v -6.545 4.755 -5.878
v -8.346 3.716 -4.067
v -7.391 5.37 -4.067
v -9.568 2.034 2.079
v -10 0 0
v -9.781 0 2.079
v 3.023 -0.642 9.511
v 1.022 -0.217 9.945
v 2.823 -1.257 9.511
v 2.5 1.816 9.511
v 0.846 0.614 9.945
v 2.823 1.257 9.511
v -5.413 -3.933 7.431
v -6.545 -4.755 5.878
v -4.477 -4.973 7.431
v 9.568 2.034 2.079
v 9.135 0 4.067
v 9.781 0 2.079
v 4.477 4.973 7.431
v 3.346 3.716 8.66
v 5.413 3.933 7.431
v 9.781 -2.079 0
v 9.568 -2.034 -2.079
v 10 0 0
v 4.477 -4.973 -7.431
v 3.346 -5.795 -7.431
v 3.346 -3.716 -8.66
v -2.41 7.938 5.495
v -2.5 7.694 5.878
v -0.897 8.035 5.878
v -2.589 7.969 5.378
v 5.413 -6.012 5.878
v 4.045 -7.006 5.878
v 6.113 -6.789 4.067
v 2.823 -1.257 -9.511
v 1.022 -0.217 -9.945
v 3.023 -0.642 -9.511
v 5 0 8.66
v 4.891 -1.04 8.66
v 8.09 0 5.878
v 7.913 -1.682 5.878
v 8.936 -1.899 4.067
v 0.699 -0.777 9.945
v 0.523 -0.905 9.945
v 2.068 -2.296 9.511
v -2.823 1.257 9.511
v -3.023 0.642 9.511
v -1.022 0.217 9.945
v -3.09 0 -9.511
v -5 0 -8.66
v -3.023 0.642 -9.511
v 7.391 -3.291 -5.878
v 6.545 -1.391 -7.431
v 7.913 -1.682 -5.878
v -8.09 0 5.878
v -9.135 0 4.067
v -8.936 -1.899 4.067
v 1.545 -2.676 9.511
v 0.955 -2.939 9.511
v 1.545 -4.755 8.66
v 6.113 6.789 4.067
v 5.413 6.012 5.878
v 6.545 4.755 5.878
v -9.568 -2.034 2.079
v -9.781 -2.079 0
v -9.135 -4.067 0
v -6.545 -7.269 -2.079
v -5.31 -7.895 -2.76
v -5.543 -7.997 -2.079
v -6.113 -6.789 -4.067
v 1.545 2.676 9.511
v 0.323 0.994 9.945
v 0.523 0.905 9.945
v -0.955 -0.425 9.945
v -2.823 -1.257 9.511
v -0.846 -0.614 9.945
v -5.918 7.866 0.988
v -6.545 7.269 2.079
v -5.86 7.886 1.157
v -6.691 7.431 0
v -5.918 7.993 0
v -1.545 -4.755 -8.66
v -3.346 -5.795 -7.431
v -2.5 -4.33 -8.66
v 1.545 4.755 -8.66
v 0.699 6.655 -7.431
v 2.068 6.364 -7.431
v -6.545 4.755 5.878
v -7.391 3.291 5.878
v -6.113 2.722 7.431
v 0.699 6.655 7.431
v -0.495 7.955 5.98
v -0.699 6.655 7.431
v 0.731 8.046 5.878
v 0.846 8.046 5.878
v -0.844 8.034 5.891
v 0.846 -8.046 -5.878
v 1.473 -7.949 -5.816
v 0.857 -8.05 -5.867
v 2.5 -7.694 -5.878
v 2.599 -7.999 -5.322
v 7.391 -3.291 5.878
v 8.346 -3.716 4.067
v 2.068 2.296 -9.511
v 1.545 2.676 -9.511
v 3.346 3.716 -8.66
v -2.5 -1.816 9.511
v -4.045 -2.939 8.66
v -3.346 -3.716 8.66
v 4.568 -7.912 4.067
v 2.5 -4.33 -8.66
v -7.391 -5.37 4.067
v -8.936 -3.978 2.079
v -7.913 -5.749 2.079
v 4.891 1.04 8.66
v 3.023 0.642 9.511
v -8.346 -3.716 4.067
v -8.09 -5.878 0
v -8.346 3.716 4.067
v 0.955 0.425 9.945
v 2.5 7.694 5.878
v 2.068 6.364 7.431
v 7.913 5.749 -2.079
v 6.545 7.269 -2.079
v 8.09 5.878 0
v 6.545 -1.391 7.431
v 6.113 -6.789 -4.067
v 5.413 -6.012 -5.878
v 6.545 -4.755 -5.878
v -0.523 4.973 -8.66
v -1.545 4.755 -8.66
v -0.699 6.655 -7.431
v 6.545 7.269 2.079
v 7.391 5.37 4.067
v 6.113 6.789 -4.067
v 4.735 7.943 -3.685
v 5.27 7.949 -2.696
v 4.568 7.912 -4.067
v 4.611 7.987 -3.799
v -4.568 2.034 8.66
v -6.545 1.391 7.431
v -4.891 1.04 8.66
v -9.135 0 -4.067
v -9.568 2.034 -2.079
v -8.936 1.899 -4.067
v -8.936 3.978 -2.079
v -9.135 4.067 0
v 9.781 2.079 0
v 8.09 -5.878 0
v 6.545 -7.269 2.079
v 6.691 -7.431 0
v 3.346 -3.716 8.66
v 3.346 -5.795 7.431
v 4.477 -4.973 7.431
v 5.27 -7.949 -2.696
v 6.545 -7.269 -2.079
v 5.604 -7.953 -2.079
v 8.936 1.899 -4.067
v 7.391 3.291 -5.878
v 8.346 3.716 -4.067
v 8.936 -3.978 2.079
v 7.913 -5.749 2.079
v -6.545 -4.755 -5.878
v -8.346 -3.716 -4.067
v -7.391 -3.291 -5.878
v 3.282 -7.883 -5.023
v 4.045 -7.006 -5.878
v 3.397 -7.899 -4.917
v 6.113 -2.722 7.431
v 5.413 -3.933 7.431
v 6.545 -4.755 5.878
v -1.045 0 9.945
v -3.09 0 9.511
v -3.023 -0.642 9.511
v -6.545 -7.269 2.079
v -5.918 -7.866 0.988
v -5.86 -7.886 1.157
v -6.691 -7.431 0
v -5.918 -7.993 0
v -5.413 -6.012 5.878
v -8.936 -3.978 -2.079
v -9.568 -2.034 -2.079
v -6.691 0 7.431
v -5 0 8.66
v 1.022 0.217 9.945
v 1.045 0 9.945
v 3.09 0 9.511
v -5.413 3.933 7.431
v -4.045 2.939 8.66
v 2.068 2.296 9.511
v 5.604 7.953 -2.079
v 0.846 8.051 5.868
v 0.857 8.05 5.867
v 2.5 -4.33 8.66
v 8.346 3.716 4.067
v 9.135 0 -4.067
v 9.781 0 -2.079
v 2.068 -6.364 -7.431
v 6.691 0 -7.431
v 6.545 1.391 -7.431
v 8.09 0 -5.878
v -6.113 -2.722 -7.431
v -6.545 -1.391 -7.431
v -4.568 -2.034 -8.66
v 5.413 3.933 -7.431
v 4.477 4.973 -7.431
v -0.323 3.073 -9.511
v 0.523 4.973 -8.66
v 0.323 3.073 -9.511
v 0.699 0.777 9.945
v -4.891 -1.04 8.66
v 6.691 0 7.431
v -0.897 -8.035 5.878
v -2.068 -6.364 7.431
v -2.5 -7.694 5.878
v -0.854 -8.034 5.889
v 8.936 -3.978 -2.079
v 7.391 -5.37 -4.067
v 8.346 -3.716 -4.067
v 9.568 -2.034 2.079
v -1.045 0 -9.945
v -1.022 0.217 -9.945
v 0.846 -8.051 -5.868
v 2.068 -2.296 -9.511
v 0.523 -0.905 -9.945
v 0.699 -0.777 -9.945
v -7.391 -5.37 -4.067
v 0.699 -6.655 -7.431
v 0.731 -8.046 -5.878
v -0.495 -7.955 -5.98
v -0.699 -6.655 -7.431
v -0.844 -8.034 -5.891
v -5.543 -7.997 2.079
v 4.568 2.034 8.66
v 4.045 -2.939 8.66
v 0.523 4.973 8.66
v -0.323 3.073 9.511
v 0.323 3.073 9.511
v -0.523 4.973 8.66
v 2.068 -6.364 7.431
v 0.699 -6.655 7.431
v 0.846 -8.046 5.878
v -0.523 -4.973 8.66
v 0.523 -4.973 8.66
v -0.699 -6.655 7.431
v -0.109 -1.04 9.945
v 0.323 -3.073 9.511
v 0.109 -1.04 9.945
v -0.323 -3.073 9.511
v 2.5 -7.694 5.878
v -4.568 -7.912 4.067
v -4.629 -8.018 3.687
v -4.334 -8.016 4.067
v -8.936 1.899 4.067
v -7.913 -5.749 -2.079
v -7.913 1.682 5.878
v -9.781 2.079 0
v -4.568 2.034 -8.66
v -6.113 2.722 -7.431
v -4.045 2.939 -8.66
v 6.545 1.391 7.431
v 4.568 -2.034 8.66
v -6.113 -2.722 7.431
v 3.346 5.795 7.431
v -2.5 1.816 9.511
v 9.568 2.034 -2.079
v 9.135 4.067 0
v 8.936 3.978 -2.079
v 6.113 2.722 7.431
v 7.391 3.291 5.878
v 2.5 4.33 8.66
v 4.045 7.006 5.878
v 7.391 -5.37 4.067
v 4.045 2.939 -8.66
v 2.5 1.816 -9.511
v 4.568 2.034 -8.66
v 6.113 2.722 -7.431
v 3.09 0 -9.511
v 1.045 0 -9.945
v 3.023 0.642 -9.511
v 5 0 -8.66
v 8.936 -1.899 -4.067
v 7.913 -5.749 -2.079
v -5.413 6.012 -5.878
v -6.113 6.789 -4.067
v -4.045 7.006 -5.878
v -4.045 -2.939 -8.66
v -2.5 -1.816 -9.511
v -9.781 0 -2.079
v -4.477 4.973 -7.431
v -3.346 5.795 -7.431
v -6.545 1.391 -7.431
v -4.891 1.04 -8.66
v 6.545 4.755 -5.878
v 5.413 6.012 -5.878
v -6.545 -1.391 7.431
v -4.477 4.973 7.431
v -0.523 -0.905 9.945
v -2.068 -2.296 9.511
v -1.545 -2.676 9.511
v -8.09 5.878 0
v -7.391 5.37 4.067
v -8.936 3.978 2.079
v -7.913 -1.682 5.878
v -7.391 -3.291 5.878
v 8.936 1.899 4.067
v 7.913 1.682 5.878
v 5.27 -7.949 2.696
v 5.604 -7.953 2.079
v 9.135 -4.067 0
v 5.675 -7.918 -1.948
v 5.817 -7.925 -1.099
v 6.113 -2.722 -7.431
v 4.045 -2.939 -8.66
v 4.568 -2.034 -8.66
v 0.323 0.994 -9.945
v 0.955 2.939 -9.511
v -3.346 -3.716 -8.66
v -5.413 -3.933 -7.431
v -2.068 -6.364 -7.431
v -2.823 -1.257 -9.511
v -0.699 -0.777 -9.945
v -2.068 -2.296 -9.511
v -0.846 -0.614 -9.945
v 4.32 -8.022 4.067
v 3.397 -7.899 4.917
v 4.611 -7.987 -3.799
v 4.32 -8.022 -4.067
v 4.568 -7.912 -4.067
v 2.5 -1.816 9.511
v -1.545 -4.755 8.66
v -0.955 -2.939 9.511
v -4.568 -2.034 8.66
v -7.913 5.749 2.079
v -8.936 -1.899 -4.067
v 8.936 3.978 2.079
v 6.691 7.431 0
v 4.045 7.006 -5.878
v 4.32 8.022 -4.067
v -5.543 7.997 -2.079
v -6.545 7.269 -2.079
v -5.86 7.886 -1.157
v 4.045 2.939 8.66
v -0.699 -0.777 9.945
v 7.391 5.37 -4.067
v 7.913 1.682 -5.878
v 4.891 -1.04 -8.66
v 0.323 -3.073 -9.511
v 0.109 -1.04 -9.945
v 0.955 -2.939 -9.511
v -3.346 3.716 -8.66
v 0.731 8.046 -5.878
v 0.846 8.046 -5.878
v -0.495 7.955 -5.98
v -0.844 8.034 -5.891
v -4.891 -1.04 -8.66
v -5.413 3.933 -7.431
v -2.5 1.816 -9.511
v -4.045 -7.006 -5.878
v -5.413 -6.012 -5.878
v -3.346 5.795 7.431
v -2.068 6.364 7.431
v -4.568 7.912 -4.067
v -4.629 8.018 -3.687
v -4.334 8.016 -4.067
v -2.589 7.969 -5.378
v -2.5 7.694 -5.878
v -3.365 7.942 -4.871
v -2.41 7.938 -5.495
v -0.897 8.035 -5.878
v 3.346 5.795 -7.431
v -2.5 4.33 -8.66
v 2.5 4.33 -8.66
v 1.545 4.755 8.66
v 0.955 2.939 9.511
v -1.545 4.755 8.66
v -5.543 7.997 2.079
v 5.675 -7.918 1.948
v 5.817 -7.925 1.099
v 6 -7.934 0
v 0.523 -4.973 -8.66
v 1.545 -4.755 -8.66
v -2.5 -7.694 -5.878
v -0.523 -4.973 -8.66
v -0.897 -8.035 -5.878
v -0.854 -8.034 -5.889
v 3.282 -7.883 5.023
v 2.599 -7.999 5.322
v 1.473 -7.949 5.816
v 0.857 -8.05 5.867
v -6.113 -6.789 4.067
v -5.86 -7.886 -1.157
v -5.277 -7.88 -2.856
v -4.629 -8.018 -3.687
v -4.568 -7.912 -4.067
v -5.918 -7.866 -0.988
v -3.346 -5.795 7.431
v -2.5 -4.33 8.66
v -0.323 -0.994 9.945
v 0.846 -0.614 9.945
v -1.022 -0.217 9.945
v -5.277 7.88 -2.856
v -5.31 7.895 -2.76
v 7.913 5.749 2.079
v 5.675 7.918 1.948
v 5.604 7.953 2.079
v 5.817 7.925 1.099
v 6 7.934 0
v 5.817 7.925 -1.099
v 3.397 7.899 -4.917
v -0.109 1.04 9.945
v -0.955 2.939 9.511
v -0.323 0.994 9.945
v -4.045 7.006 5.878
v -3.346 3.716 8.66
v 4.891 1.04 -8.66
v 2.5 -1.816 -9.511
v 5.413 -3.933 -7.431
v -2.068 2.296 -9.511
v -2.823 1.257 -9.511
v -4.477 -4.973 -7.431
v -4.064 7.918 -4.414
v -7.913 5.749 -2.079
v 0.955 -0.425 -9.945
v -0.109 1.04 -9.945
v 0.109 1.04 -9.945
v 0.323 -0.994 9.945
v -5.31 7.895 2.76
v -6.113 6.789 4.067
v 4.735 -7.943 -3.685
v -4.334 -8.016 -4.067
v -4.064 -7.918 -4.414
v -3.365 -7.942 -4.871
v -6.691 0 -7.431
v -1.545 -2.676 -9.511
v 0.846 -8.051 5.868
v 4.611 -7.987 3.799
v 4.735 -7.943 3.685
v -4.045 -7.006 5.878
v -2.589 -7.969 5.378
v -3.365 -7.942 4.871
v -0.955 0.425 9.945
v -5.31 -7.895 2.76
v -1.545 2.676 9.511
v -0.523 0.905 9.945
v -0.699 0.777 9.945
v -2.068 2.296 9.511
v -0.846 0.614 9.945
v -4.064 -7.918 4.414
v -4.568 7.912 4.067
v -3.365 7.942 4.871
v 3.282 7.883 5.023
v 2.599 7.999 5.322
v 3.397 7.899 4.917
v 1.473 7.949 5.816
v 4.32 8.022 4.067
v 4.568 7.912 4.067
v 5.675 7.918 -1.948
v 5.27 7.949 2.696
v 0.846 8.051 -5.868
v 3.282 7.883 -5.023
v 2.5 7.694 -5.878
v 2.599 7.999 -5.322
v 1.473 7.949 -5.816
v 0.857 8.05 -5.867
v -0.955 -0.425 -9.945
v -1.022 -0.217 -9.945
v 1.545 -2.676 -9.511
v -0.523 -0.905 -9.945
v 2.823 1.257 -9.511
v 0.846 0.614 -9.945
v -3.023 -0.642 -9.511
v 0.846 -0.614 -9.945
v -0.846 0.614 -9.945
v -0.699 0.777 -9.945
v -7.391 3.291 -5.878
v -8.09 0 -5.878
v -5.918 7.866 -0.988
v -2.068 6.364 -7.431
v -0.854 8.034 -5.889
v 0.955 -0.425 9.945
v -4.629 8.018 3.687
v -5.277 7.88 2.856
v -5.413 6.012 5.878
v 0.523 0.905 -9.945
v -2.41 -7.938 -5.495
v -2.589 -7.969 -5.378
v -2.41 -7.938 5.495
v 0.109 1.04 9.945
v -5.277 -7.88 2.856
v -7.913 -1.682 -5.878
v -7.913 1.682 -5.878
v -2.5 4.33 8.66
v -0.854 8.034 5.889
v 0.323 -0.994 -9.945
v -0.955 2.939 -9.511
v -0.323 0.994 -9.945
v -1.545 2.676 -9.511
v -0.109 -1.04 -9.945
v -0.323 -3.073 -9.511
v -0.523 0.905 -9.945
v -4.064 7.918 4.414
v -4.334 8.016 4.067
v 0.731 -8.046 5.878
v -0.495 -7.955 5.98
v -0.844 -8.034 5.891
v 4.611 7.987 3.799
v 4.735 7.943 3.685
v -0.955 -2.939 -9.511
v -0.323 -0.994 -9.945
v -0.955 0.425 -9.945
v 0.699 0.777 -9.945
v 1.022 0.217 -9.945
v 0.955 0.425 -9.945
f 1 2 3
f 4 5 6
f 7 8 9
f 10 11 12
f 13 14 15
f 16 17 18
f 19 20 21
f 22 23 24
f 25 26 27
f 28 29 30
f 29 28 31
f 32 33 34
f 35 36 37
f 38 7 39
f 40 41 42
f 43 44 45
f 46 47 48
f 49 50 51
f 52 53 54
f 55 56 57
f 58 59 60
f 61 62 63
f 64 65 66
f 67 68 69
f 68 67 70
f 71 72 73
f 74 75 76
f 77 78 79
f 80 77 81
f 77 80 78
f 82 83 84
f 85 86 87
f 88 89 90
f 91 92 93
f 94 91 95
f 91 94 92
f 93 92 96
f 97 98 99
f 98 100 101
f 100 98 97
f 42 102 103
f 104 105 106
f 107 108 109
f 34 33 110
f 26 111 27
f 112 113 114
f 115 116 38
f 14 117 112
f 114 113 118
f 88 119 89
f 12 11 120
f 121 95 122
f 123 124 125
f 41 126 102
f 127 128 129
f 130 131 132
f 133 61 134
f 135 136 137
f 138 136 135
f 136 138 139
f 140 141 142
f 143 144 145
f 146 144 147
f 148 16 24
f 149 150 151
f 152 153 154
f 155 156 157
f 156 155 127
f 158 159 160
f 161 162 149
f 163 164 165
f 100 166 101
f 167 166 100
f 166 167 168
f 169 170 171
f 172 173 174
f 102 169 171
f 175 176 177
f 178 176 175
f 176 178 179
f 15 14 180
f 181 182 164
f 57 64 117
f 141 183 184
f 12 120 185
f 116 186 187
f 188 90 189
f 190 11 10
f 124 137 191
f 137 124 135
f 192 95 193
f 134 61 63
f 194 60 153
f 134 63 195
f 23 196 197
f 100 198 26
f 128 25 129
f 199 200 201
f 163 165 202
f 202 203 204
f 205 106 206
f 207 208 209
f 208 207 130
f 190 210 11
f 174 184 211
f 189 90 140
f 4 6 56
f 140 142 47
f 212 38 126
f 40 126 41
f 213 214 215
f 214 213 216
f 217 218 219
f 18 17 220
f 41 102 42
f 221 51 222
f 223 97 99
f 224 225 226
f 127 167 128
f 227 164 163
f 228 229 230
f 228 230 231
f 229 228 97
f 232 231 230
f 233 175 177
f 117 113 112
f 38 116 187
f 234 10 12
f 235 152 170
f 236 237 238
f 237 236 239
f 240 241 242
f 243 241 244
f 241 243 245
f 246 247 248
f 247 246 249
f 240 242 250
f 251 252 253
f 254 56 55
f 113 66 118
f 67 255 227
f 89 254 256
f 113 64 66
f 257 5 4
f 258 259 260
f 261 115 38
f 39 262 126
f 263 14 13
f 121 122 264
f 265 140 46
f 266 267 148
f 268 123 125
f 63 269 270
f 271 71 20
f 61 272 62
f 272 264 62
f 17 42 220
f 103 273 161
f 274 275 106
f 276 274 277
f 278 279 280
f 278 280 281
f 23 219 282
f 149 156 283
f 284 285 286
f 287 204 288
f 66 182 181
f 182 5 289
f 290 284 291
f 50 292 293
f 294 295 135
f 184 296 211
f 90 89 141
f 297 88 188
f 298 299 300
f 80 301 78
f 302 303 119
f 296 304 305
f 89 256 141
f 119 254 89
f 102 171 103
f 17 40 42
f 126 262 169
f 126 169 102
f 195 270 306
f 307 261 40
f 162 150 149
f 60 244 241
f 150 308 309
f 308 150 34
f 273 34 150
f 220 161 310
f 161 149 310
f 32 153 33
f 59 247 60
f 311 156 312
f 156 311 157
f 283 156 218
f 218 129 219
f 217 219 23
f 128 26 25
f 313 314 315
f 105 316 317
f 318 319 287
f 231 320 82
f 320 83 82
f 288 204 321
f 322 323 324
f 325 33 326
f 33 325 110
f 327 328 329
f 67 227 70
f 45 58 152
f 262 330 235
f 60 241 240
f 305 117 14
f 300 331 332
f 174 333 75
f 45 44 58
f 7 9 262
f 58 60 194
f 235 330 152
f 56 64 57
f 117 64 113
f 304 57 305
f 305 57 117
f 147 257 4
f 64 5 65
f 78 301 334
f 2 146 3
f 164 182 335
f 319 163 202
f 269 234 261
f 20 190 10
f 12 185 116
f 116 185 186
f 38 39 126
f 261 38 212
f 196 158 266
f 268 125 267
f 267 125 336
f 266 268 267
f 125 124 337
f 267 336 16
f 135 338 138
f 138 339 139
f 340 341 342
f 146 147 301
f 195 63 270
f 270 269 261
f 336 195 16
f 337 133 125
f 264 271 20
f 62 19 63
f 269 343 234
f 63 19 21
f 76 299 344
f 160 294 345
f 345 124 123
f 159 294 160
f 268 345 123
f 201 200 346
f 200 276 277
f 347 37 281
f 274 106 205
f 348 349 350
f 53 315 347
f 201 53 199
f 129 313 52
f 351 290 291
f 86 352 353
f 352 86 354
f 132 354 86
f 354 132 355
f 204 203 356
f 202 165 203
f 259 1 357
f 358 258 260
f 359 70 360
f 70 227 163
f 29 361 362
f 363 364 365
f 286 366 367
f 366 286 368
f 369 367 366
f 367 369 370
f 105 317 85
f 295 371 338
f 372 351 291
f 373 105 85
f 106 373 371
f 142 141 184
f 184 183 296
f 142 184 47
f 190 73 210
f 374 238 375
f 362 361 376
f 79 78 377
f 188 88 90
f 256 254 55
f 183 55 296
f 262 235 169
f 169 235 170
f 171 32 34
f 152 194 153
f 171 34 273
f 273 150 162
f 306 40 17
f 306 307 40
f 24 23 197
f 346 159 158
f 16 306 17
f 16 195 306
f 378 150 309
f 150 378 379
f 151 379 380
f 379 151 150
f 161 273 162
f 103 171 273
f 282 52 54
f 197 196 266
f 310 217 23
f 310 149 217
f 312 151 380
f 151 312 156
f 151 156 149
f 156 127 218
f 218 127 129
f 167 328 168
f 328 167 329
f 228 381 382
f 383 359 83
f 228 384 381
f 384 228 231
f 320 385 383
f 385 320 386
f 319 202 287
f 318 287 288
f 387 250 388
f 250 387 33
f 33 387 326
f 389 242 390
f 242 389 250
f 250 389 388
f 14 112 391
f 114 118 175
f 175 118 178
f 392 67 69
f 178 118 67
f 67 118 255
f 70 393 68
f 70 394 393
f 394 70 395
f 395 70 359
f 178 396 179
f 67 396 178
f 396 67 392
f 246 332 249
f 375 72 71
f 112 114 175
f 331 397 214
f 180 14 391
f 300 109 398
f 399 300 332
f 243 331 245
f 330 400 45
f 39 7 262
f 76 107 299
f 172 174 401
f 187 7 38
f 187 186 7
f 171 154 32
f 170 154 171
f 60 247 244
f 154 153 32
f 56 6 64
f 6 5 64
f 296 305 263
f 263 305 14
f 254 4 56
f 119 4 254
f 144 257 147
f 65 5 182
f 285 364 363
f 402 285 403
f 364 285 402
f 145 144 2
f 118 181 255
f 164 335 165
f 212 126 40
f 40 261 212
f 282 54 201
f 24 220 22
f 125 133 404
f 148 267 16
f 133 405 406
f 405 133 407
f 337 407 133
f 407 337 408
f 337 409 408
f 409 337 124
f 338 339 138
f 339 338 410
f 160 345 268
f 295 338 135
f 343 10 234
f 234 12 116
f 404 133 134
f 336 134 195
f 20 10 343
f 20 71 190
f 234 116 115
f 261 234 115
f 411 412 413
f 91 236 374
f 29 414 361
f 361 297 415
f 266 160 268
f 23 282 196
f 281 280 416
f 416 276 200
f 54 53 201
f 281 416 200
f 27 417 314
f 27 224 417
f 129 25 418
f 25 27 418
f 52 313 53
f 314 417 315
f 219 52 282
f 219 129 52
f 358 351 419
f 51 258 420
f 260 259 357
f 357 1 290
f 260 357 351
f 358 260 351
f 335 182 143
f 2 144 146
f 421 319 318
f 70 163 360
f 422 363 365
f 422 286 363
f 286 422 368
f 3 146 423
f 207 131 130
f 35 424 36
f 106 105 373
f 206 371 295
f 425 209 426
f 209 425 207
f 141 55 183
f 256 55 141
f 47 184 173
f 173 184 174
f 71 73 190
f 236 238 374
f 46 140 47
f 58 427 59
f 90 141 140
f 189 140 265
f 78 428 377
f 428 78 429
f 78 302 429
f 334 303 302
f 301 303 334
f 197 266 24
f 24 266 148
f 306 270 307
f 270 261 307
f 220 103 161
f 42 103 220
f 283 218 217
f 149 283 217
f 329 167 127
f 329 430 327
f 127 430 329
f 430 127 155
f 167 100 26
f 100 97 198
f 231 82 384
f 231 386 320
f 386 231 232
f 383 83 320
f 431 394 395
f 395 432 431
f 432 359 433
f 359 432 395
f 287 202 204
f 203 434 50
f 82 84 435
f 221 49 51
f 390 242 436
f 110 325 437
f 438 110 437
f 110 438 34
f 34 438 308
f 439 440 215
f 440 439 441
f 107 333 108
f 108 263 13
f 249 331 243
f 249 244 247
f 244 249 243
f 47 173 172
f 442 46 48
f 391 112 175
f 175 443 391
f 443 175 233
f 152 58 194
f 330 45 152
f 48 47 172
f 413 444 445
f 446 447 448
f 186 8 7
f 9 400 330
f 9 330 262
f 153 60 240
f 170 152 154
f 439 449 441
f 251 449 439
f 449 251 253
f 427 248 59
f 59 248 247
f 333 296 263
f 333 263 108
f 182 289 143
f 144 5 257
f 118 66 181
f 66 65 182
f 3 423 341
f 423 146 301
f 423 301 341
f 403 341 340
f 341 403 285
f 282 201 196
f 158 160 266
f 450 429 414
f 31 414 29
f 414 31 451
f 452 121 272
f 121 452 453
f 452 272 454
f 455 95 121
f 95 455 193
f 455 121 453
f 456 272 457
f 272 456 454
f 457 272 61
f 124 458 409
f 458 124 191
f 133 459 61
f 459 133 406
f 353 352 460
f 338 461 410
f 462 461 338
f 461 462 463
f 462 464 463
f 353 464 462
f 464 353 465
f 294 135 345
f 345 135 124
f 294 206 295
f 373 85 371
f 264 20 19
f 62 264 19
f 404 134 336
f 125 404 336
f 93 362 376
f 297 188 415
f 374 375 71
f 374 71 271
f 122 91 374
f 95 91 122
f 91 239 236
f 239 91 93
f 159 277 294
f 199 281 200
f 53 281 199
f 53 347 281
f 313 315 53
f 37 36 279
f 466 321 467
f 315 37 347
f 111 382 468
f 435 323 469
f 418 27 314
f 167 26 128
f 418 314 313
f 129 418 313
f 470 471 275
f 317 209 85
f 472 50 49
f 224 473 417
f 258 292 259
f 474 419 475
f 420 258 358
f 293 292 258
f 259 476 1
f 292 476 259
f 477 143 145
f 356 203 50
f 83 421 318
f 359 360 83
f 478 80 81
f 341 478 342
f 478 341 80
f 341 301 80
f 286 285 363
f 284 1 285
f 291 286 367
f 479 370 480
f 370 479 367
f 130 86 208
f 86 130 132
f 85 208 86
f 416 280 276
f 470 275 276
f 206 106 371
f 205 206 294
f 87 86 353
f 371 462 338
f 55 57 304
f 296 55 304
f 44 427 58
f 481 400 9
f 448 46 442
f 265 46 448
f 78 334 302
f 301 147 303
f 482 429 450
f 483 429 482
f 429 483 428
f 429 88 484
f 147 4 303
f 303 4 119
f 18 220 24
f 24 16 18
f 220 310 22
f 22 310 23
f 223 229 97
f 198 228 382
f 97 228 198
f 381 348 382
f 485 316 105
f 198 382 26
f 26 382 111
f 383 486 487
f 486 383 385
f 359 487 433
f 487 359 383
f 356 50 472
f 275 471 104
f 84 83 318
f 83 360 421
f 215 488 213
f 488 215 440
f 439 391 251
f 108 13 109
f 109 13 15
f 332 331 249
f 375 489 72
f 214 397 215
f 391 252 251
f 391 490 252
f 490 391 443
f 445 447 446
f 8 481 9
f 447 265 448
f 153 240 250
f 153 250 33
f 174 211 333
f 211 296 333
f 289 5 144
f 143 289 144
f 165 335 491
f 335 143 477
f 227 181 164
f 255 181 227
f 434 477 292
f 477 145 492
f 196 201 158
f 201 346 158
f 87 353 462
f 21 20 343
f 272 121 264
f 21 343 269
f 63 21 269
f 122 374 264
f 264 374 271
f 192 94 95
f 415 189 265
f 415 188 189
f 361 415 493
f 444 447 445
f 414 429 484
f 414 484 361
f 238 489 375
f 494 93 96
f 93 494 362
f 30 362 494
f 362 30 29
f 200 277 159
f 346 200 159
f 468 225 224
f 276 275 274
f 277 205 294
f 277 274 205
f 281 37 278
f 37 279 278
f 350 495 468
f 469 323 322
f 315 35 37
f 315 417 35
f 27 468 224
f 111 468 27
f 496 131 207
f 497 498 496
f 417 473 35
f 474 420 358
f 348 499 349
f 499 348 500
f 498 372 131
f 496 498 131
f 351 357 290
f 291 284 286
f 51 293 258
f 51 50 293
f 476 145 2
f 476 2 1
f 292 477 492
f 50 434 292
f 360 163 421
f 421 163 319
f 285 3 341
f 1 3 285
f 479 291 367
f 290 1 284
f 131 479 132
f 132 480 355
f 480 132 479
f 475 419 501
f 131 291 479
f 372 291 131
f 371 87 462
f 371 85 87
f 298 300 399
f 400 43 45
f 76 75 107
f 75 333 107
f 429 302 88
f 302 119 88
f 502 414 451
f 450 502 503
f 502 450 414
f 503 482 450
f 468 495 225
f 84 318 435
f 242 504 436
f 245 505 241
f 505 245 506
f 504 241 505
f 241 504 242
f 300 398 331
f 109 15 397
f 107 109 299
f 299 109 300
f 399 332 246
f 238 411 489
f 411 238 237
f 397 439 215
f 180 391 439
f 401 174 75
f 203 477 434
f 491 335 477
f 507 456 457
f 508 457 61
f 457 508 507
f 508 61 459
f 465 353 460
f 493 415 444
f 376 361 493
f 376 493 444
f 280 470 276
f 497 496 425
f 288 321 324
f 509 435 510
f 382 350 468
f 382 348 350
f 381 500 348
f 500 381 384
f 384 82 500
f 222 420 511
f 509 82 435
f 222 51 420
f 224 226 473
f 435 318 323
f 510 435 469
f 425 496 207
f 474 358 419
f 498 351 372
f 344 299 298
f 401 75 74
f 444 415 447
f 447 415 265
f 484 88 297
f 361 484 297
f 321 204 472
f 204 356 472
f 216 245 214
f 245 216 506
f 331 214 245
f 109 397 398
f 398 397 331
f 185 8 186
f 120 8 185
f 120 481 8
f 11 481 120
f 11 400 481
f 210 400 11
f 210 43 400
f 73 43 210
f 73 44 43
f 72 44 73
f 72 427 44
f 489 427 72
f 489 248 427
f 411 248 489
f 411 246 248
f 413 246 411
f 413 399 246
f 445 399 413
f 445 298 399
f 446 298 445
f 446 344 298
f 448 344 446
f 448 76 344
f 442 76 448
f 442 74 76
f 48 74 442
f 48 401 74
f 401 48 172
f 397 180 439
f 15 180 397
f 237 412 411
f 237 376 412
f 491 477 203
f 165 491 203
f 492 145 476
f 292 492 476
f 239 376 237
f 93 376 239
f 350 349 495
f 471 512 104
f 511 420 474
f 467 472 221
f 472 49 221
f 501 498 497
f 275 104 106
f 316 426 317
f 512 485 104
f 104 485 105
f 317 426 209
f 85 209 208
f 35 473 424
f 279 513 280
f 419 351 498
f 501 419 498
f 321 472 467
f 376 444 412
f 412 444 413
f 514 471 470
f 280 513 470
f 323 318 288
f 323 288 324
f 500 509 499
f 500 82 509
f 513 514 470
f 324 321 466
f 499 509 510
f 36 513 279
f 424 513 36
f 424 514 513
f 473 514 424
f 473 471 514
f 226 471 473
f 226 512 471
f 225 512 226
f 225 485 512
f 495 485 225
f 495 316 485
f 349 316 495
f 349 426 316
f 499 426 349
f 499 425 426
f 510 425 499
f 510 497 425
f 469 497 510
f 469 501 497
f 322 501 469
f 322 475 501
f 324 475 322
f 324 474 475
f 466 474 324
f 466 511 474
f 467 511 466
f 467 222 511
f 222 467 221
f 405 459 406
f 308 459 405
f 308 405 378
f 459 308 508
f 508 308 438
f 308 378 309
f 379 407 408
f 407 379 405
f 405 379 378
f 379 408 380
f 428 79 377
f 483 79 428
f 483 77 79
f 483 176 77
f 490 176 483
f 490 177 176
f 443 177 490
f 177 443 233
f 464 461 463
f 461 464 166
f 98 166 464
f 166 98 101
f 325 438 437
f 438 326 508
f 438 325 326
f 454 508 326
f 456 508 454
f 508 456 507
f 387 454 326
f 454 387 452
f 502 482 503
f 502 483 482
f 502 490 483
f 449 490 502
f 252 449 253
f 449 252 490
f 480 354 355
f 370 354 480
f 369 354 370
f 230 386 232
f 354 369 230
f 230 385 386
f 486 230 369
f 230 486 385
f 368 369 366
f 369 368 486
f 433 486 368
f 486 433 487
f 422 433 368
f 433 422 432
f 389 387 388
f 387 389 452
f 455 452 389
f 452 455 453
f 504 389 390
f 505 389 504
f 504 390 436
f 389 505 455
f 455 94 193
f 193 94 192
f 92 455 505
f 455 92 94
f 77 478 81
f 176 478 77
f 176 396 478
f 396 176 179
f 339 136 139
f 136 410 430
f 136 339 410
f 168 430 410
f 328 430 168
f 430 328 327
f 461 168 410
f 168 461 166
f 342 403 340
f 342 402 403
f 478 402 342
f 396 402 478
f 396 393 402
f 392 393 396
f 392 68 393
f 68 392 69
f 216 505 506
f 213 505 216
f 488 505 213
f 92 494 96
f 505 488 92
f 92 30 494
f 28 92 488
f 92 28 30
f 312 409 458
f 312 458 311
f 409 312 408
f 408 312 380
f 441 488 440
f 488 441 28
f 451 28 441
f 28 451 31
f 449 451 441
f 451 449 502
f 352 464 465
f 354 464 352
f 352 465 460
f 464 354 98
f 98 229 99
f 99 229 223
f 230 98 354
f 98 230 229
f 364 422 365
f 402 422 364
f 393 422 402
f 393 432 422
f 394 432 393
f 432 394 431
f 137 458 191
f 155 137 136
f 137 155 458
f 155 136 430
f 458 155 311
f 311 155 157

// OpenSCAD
module all_transparent() {
 %children();
}

module first_transparent() {
 %children(0);
}

difference() {
  sphere(r=10);
  all_transparent() cylinder(h=30, r=6, center=true);
  first_transparent() rotate([90,0,0]) cylinder(h=30, r=6, center=true);
}
